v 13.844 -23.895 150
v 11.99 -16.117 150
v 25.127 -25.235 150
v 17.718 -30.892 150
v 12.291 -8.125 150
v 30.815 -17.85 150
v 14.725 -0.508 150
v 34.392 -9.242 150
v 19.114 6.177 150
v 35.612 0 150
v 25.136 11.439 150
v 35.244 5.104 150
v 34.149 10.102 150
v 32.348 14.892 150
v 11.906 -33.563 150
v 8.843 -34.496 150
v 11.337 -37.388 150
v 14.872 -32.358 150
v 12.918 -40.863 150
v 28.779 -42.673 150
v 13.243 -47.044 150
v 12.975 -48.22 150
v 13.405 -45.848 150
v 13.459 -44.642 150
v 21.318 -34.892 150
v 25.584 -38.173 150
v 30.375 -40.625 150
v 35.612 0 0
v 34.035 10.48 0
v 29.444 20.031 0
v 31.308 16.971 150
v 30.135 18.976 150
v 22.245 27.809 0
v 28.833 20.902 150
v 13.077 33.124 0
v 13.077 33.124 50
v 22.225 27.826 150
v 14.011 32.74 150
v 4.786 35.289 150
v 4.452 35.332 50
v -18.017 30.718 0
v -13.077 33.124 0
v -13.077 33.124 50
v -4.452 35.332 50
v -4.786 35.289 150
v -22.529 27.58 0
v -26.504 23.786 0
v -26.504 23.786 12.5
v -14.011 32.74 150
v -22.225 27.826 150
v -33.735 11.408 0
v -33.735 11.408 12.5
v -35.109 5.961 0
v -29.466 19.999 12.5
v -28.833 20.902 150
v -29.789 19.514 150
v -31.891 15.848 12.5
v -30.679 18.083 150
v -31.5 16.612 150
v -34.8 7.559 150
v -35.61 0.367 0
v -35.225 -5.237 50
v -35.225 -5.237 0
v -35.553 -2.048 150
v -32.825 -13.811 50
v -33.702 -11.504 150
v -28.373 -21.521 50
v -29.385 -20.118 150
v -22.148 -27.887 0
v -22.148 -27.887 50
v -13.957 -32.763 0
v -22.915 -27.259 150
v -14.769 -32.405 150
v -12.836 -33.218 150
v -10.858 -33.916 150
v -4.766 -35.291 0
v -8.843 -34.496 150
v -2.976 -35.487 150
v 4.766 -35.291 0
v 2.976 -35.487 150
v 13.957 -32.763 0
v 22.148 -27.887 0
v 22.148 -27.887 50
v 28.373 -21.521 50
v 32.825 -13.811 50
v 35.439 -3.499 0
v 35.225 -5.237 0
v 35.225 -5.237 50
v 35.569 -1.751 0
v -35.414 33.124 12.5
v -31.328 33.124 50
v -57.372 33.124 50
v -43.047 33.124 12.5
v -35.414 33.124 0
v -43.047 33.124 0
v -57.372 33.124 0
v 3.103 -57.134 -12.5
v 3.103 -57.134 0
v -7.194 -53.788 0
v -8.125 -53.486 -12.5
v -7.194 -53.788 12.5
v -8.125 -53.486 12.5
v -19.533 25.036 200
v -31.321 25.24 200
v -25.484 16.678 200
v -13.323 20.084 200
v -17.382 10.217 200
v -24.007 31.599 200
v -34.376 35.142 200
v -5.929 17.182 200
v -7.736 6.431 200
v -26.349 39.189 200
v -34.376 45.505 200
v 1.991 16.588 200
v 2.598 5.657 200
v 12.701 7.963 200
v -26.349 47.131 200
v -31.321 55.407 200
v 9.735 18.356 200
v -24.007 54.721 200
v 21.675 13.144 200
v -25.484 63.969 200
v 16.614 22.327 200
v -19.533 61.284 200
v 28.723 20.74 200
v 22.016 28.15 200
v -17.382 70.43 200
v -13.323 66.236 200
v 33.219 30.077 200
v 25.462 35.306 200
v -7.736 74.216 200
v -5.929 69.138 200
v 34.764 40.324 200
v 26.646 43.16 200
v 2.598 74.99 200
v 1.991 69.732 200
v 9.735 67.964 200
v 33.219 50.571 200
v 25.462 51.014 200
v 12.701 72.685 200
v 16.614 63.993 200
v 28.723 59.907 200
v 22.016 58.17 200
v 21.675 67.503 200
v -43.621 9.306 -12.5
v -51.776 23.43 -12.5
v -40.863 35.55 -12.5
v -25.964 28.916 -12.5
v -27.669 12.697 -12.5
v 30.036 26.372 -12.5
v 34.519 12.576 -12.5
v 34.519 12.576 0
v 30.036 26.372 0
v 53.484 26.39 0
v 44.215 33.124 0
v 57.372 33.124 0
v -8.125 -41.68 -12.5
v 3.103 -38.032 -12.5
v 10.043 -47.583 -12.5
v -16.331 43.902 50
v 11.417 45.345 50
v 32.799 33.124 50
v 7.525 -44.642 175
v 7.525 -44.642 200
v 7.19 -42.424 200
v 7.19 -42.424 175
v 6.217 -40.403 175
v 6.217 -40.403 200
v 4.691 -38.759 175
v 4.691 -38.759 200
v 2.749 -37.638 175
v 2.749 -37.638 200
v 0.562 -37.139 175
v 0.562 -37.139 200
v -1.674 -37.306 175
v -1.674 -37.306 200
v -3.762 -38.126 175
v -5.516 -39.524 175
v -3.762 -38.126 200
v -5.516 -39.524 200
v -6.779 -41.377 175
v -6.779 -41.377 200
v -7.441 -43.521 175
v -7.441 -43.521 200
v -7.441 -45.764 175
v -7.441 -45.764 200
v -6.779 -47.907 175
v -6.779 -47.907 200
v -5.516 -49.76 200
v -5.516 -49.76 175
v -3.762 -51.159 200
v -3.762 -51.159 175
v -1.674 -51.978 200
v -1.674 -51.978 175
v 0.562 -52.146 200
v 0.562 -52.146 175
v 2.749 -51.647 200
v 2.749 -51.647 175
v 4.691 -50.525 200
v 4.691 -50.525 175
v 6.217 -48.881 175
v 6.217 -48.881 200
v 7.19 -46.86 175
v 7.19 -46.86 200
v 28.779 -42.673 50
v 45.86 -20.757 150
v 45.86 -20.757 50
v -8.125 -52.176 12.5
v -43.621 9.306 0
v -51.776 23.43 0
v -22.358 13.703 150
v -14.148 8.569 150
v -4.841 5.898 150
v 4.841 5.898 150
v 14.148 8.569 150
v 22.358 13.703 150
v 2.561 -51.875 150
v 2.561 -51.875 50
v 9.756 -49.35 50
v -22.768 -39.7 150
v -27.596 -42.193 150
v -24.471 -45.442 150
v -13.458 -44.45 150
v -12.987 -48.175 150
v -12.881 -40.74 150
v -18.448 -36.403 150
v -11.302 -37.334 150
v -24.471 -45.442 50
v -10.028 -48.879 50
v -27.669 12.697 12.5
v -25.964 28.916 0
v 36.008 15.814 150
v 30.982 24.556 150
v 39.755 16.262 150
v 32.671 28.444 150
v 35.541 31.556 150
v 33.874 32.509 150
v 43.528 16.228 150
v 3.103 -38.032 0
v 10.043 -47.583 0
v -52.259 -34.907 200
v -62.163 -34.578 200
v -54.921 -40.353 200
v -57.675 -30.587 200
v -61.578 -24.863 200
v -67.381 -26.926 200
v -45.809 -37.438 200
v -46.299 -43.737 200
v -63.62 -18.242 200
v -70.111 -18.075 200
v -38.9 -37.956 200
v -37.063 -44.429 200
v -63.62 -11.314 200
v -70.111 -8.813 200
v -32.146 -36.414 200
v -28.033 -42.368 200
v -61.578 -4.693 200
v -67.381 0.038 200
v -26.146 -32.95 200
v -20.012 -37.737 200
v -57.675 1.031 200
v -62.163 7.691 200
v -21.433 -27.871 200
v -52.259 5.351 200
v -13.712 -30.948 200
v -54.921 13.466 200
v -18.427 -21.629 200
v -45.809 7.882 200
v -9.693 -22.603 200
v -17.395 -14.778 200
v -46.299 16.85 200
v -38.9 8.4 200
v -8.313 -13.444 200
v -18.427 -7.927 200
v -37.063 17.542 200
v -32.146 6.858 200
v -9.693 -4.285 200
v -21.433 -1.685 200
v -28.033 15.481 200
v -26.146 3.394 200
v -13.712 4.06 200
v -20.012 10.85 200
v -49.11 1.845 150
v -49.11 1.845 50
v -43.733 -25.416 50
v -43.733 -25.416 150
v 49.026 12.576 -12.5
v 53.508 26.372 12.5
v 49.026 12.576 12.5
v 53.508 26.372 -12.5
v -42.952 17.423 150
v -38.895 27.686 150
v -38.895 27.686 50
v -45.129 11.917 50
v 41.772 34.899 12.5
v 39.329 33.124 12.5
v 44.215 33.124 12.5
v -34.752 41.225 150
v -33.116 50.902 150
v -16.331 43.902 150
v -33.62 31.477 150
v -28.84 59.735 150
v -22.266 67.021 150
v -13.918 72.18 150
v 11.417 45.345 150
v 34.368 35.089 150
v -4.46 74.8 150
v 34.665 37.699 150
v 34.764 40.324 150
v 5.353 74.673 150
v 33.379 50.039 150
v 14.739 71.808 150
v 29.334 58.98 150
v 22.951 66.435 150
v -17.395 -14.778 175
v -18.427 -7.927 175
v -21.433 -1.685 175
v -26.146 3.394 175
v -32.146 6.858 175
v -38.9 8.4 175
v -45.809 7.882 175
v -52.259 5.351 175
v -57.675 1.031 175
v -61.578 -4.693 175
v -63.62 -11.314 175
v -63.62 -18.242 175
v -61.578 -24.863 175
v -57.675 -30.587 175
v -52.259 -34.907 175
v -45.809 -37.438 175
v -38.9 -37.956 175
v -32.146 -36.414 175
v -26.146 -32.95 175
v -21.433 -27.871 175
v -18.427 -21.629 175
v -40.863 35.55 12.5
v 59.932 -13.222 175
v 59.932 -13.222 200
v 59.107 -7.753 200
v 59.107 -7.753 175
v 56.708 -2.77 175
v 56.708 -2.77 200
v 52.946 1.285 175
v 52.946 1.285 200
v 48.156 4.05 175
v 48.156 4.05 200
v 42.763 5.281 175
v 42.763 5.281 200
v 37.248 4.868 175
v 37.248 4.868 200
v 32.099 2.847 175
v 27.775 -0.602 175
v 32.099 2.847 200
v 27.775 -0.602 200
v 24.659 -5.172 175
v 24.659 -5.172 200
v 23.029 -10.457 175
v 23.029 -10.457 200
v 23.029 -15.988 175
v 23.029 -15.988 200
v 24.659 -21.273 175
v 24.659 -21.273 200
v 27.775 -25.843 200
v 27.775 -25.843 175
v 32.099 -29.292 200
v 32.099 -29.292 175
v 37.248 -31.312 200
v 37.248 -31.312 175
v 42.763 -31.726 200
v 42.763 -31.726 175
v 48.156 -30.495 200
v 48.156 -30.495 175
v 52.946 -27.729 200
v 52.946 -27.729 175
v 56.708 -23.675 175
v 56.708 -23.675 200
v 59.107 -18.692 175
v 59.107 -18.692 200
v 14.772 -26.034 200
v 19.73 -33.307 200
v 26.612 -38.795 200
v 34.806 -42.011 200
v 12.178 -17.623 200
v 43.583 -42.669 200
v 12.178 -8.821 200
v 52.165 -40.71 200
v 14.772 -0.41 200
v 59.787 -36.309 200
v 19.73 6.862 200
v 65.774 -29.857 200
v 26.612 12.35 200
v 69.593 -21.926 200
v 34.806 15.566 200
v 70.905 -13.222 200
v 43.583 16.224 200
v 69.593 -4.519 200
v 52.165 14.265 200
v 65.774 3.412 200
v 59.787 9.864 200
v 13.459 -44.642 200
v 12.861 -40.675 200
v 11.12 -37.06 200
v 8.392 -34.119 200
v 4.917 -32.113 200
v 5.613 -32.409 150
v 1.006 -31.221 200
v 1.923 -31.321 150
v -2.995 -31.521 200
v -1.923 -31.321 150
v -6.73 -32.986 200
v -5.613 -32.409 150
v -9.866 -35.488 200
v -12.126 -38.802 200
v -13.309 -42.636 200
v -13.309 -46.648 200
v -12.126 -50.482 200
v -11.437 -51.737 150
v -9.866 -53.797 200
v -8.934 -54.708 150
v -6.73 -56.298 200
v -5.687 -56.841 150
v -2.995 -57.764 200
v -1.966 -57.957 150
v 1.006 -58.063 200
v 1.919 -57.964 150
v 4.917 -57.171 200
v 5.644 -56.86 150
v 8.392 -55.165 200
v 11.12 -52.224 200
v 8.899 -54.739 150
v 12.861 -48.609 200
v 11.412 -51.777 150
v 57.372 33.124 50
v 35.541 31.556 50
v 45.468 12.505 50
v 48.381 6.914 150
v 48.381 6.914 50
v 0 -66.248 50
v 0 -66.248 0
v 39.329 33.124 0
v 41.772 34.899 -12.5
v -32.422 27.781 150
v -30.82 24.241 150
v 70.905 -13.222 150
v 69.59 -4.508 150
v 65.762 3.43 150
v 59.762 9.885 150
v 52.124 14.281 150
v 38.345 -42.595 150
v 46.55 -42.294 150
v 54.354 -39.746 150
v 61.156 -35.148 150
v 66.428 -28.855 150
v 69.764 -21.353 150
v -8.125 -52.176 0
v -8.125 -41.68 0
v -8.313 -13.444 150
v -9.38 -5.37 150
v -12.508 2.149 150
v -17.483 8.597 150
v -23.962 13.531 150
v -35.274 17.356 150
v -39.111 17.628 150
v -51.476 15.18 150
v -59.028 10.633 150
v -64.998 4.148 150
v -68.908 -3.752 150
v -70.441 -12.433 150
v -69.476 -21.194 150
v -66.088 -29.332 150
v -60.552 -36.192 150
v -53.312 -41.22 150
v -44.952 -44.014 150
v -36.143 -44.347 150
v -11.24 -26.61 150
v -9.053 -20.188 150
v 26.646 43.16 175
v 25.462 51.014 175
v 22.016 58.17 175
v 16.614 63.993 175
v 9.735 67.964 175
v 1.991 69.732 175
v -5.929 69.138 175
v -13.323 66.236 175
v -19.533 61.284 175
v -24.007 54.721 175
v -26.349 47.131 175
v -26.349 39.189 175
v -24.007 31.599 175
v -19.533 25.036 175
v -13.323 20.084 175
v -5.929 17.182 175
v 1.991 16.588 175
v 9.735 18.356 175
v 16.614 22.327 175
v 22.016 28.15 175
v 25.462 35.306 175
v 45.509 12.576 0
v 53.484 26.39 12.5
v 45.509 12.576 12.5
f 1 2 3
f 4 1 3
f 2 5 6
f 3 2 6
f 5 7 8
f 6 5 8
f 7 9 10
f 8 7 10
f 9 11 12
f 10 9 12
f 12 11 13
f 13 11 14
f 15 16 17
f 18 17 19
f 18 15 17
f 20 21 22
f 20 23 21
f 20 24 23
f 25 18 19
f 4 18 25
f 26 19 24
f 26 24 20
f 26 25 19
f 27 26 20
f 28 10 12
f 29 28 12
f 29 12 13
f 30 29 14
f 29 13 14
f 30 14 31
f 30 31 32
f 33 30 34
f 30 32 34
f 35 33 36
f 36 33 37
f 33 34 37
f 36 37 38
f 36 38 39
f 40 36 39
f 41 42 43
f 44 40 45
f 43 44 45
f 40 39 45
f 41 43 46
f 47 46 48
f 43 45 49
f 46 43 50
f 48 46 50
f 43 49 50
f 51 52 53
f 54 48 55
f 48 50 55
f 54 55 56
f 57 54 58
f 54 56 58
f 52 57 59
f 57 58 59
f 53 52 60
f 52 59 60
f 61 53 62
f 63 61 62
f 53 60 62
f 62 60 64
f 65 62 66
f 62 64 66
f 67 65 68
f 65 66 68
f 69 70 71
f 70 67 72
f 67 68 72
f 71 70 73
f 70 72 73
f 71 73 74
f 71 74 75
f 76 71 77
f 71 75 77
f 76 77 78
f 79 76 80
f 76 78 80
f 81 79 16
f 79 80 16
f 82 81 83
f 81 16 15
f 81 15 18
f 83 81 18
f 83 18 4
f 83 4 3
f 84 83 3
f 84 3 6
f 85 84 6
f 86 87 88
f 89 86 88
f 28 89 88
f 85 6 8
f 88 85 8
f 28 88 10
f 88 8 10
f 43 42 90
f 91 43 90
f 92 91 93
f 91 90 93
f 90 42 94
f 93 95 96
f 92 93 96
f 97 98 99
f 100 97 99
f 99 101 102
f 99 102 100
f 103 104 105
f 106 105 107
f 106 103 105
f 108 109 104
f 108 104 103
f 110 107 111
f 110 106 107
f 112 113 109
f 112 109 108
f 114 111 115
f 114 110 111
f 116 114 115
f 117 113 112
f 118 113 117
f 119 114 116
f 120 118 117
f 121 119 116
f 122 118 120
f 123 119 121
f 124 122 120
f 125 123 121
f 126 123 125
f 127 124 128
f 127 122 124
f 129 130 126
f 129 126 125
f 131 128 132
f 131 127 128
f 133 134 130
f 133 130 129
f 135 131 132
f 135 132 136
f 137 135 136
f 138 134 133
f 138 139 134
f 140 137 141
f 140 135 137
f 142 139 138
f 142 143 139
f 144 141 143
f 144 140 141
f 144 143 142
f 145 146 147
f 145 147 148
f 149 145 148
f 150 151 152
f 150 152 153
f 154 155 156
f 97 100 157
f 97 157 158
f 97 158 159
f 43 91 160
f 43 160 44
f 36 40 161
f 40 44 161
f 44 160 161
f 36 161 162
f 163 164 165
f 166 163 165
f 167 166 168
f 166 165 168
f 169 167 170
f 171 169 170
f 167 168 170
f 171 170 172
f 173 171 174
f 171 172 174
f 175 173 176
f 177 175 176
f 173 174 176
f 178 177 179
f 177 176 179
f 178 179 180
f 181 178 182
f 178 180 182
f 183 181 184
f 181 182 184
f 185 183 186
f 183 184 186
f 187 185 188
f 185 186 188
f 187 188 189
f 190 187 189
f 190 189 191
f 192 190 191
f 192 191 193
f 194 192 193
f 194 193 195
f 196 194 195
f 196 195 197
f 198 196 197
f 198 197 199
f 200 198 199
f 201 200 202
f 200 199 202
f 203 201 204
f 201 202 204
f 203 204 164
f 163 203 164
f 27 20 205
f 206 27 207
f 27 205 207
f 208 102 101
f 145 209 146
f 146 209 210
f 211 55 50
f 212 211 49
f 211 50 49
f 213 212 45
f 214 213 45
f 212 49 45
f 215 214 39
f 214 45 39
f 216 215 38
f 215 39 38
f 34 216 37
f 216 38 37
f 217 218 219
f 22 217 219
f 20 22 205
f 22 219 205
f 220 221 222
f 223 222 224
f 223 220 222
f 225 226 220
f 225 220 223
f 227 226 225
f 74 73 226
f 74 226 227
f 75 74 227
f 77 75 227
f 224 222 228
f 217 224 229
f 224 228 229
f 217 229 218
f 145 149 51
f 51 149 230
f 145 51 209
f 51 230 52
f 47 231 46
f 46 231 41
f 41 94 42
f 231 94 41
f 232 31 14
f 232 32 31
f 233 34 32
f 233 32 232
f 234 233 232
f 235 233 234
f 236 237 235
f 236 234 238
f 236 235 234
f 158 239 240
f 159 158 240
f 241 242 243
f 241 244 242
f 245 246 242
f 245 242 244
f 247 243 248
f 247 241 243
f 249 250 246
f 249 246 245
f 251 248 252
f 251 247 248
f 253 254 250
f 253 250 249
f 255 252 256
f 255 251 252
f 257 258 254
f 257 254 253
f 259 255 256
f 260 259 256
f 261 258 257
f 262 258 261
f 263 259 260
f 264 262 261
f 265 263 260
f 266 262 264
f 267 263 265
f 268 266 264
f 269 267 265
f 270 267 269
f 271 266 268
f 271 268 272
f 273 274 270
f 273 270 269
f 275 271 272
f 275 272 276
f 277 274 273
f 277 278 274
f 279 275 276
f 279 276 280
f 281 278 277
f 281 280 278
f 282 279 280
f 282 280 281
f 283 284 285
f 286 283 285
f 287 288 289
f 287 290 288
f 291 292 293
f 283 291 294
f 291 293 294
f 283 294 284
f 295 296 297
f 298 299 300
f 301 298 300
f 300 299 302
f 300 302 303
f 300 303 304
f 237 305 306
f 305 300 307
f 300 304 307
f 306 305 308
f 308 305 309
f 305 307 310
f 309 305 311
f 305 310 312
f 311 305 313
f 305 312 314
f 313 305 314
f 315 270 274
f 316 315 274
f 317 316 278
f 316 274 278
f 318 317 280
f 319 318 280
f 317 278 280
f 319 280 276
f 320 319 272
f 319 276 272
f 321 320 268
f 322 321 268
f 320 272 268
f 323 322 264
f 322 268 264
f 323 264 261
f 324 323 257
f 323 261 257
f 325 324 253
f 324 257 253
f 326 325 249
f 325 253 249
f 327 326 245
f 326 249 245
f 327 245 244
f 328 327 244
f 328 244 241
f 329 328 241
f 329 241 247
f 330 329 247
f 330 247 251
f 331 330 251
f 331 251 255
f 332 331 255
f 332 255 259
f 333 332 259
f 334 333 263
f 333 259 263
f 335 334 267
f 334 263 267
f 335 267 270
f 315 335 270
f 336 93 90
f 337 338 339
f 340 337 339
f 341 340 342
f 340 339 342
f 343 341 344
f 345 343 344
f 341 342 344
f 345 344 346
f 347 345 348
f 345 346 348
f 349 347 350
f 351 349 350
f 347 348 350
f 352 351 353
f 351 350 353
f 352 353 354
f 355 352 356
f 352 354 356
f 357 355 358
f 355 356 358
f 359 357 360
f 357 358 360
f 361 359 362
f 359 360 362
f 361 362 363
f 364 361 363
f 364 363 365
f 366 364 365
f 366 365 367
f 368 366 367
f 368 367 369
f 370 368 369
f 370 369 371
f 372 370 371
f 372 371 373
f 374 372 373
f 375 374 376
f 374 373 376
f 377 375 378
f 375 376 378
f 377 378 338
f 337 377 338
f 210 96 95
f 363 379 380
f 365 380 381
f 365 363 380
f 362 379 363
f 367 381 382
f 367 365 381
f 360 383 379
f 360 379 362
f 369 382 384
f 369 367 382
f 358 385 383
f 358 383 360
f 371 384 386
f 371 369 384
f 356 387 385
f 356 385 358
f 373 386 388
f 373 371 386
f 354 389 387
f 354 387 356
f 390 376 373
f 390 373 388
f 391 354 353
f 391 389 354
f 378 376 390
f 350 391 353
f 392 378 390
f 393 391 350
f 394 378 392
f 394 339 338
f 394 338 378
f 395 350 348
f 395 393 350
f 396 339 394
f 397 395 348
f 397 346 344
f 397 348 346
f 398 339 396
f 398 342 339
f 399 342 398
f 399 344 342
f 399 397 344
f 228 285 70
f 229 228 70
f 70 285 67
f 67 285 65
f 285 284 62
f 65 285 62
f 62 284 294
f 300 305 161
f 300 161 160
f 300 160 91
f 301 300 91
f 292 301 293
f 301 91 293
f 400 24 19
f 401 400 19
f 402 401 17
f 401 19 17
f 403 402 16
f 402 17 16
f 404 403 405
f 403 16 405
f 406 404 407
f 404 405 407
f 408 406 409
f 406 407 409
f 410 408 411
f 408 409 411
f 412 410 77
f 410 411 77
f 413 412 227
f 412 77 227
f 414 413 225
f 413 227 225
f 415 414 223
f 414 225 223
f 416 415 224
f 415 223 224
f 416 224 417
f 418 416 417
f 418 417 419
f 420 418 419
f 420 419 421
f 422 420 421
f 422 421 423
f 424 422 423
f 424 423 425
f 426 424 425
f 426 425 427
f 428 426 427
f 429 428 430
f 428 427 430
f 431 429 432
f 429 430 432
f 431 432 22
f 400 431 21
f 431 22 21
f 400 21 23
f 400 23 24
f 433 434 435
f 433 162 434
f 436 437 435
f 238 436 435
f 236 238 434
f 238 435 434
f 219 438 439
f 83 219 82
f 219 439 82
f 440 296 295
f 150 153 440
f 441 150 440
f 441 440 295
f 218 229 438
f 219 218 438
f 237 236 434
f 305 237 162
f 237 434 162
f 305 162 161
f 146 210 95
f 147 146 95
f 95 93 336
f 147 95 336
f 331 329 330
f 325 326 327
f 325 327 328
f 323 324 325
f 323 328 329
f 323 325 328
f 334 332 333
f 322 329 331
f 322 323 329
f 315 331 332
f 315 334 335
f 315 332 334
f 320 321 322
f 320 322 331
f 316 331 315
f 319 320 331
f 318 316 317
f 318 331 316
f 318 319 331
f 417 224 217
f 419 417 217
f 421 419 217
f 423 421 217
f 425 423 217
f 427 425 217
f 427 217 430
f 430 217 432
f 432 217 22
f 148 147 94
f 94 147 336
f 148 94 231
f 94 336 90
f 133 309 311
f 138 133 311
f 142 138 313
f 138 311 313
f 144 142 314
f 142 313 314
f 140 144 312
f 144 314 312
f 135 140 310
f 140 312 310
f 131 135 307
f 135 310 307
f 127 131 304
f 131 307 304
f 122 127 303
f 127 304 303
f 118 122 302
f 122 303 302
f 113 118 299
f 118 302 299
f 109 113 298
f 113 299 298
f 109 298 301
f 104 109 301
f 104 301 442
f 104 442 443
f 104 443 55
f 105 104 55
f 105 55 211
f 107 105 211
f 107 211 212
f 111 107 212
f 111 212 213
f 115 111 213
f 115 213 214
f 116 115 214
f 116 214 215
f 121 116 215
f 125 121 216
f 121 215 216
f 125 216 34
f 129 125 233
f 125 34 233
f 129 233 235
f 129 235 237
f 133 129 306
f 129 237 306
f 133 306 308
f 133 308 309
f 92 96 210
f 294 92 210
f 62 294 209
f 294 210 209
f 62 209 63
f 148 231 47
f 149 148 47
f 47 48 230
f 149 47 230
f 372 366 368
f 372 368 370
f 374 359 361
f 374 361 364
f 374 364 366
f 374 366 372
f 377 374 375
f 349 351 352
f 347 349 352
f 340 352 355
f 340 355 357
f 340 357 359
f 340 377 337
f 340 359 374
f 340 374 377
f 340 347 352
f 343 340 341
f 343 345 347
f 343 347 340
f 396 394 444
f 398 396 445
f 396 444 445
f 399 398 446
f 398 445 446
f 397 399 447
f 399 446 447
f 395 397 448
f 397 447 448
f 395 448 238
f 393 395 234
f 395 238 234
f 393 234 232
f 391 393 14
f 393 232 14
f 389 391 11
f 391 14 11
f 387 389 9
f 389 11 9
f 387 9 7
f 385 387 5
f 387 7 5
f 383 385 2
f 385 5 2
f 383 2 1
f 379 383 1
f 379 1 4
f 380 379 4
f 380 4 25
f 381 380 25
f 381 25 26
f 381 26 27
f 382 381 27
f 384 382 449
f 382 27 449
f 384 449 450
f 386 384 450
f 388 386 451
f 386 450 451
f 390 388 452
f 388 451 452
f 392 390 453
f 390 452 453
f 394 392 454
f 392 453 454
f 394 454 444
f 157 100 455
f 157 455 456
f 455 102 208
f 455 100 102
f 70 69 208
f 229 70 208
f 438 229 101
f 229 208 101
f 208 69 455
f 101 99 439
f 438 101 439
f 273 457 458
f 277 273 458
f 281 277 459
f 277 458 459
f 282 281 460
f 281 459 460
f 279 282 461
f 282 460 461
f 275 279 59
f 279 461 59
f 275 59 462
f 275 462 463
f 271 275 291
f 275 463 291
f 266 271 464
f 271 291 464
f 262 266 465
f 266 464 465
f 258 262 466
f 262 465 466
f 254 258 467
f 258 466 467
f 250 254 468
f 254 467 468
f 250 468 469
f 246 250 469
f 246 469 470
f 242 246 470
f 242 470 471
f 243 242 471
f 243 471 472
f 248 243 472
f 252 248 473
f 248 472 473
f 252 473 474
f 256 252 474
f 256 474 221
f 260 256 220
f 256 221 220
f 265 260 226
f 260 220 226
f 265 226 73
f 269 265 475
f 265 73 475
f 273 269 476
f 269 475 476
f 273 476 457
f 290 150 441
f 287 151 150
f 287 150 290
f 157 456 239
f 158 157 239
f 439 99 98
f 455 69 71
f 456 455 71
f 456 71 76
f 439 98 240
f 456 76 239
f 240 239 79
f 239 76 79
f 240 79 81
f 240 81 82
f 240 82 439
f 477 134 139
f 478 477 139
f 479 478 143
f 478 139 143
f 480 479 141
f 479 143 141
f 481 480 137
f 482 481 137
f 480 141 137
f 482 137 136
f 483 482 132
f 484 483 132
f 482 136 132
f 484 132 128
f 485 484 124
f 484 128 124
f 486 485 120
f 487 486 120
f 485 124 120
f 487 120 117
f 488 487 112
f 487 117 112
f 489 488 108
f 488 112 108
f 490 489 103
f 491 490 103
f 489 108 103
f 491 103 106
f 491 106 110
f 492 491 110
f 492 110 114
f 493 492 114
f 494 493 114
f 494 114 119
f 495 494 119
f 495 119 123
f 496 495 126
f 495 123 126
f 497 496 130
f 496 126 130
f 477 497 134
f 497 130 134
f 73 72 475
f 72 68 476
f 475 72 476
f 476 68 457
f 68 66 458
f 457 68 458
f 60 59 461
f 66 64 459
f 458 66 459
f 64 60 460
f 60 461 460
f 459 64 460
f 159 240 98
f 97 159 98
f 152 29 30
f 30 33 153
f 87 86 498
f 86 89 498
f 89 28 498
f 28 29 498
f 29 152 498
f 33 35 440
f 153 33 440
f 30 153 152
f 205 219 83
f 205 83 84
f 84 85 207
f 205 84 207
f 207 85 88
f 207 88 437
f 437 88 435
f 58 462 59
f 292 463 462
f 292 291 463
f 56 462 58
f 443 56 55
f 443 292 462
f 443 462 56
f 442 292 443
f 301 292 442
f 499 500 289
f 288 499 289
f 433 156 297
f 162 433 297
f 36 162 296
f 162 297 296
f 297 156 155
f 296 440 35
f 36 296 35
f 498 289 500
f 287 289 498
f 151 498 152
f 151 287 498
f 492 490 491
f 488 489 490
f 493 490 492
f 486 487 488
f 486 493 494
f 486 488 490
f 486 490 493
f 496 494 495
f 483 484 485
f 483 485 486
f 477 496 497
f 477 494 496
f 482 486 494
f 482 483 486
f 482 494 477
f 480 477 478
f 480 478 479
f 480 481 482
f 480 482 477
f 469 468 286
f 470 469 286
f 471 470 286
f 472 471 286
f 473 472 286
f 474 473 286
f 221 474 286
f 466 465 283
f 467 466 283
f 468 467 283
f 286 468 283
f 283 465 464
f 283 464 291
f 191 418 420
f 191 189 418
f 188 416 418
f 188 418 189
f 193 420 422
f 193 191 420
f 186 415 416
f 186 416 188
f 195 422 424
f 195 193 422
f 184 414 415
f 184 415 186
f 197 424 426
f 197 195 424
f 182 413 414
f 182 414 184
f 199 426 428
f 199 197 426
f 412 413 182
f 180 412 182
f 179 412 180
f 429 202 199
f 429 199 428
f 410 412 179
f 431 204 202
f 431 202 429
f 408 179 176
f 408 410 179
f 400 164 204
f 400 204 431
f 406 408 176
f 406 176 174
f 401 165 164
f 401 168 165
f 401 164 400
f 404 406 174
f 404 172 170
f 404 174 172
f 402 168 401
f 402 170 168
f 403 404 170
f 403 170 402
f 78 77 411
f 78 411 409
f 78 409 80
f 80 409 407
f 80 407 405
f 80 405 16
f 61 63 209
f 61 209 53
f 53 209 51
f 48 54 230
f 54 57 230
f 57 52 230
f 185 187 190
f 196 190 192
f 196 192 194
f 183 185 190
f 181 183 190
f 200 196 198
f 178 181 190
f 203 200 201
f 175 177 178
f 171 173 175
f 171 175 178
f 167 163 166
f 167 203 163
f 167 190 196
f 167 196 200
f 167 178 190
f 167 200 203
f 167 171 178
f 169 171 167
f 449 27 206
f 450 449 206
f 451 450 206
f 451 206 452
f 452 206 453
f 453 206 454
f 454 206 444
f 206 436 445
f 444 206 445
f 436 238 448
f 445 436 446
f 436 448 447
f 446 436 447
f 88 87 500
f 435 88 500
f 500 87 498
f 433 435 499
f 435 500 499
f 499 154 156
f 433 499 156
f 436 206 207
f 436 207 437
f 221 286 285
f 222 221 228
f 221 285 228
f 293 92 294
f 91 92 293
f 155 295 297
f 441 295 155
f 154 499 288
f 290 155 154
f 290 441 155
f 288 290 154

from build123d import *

# Parameters (mm, degrees)
F1_DEPTH  = 50
F3_DEPTH  = 100
F4_R      = 35.61174
F5_DEPTH  = 150.001
F6_R      = 34.763964
F6_R_2    = 13.459026
F6_R_3    = 29.528725
F6_R_4    = 31.072571
F7_DEPTH  = 50
F9_DEPTH  = 12.5
F10_R     = 7.524559
F11_DEPTH = 25
F12_R     = 18.555178
F12_R_2   = 23.242661
F12_R_3   = 26.64625
F13_DEPTH = 25


with BuildPart() as f1:
    # F0 (on Top) → F1 (new body)
    with BuildSketch(Plane.XY):
        Polygon((57.372367, 33.123951), (-57.372367, 33.123951), (0, -66.247903), align=None)
    extrude(amount=F1_DEPTH)

    # F2 (on face) → F3 (join)
    with BuildSketch(Plane.XY.offset(50)):
        Polygon((35.541334, 31.556312), (11.41747, 45.344661), (-16.331361, 43.901813), (-38.895099, 27.685861), (-49.109919, 1.845256), (-43.732686, -25.415792), (-24.470635, -45.442094), (2.560671, -51.87544), (28.778981, -42.673288), (45.860168, -20.757257), (48.381076, 6.914469), align=None)
    extrude(amount=F3_DEPTH)

    # F4 (on face) → F5 (cut, through all)
    with BuildSketch(Plane.XY.offset(150)):
        Circle(F4_R)
    extrude(amount=-F5_DEPTH, mode=Mode.SUBTRACT)

    # F6 (on face) → F7 (join)
    with BuildSketch(Plane.XY.offset(150)):
        with Locations((0, 40.323675)):
            Circle(F6_R)
        with Locations((0, -44.642087)):
            Circle(F6_R_2)
        with Locations((41.376553, -13.222456)):
            Circle(F6_R_3)
        with Locations((-39.38517, -13.44372)):
            Circle(F6_R_4)
    extrude(amount=F7_DEPTH)

    # F8 (on face) → F9 (join, symmetric)
    with BuildSketch(Plane(origin=(0, 0, 0), x_dir=(1, 0, 0), z_dir=(0, 0, -1))):
        Polygon((-43.621281, -9.306372), (-51.77561, -23.430084), (-40.862988, -35.549779), (-25.964287, -28.91645), (-27.669006, -12.697132), align=None)
        Polygon((-8.124595, 53.485743), (-8.124595, 41.680016), (3.103319, 38.031846), (10.042551, 47.58288), (3.103319, 57.133913), align=None)
        Polygon((49.025573, -12.575652), (34.519002, -12.575652), (30.036225, -26.37222), (41.772287, -34.898969), (53.50835, -26.37222), align=None)
    extrude(amount=F9_DEPTH, both=True)

    # F10 (on face) → F11 (cut)
    with BuildSketch(Plane.XY.offset(200)):
        with Locations((0, -44.642087)):
            Circle(F10_R)
    extrude(amount=-F11_DEPTH, mode=Mode.SUBTRACT)

    # F12 (on face) → F13 (cut)
    with BuildSketch(Plane.XY.offset(200)):
        with Locations((41.376553, -13.222456)):
            Circle(F12_R)
        with Locations((-40.637251, -14.778094)):
            Circle(F12_R_2)
        with Locations((0, 43.16001)):
            Circle(F12_R_3)
    extrude(amount=-F13_DEPTH, mode=Mode.SUBTRACT)


solid = f1.part
